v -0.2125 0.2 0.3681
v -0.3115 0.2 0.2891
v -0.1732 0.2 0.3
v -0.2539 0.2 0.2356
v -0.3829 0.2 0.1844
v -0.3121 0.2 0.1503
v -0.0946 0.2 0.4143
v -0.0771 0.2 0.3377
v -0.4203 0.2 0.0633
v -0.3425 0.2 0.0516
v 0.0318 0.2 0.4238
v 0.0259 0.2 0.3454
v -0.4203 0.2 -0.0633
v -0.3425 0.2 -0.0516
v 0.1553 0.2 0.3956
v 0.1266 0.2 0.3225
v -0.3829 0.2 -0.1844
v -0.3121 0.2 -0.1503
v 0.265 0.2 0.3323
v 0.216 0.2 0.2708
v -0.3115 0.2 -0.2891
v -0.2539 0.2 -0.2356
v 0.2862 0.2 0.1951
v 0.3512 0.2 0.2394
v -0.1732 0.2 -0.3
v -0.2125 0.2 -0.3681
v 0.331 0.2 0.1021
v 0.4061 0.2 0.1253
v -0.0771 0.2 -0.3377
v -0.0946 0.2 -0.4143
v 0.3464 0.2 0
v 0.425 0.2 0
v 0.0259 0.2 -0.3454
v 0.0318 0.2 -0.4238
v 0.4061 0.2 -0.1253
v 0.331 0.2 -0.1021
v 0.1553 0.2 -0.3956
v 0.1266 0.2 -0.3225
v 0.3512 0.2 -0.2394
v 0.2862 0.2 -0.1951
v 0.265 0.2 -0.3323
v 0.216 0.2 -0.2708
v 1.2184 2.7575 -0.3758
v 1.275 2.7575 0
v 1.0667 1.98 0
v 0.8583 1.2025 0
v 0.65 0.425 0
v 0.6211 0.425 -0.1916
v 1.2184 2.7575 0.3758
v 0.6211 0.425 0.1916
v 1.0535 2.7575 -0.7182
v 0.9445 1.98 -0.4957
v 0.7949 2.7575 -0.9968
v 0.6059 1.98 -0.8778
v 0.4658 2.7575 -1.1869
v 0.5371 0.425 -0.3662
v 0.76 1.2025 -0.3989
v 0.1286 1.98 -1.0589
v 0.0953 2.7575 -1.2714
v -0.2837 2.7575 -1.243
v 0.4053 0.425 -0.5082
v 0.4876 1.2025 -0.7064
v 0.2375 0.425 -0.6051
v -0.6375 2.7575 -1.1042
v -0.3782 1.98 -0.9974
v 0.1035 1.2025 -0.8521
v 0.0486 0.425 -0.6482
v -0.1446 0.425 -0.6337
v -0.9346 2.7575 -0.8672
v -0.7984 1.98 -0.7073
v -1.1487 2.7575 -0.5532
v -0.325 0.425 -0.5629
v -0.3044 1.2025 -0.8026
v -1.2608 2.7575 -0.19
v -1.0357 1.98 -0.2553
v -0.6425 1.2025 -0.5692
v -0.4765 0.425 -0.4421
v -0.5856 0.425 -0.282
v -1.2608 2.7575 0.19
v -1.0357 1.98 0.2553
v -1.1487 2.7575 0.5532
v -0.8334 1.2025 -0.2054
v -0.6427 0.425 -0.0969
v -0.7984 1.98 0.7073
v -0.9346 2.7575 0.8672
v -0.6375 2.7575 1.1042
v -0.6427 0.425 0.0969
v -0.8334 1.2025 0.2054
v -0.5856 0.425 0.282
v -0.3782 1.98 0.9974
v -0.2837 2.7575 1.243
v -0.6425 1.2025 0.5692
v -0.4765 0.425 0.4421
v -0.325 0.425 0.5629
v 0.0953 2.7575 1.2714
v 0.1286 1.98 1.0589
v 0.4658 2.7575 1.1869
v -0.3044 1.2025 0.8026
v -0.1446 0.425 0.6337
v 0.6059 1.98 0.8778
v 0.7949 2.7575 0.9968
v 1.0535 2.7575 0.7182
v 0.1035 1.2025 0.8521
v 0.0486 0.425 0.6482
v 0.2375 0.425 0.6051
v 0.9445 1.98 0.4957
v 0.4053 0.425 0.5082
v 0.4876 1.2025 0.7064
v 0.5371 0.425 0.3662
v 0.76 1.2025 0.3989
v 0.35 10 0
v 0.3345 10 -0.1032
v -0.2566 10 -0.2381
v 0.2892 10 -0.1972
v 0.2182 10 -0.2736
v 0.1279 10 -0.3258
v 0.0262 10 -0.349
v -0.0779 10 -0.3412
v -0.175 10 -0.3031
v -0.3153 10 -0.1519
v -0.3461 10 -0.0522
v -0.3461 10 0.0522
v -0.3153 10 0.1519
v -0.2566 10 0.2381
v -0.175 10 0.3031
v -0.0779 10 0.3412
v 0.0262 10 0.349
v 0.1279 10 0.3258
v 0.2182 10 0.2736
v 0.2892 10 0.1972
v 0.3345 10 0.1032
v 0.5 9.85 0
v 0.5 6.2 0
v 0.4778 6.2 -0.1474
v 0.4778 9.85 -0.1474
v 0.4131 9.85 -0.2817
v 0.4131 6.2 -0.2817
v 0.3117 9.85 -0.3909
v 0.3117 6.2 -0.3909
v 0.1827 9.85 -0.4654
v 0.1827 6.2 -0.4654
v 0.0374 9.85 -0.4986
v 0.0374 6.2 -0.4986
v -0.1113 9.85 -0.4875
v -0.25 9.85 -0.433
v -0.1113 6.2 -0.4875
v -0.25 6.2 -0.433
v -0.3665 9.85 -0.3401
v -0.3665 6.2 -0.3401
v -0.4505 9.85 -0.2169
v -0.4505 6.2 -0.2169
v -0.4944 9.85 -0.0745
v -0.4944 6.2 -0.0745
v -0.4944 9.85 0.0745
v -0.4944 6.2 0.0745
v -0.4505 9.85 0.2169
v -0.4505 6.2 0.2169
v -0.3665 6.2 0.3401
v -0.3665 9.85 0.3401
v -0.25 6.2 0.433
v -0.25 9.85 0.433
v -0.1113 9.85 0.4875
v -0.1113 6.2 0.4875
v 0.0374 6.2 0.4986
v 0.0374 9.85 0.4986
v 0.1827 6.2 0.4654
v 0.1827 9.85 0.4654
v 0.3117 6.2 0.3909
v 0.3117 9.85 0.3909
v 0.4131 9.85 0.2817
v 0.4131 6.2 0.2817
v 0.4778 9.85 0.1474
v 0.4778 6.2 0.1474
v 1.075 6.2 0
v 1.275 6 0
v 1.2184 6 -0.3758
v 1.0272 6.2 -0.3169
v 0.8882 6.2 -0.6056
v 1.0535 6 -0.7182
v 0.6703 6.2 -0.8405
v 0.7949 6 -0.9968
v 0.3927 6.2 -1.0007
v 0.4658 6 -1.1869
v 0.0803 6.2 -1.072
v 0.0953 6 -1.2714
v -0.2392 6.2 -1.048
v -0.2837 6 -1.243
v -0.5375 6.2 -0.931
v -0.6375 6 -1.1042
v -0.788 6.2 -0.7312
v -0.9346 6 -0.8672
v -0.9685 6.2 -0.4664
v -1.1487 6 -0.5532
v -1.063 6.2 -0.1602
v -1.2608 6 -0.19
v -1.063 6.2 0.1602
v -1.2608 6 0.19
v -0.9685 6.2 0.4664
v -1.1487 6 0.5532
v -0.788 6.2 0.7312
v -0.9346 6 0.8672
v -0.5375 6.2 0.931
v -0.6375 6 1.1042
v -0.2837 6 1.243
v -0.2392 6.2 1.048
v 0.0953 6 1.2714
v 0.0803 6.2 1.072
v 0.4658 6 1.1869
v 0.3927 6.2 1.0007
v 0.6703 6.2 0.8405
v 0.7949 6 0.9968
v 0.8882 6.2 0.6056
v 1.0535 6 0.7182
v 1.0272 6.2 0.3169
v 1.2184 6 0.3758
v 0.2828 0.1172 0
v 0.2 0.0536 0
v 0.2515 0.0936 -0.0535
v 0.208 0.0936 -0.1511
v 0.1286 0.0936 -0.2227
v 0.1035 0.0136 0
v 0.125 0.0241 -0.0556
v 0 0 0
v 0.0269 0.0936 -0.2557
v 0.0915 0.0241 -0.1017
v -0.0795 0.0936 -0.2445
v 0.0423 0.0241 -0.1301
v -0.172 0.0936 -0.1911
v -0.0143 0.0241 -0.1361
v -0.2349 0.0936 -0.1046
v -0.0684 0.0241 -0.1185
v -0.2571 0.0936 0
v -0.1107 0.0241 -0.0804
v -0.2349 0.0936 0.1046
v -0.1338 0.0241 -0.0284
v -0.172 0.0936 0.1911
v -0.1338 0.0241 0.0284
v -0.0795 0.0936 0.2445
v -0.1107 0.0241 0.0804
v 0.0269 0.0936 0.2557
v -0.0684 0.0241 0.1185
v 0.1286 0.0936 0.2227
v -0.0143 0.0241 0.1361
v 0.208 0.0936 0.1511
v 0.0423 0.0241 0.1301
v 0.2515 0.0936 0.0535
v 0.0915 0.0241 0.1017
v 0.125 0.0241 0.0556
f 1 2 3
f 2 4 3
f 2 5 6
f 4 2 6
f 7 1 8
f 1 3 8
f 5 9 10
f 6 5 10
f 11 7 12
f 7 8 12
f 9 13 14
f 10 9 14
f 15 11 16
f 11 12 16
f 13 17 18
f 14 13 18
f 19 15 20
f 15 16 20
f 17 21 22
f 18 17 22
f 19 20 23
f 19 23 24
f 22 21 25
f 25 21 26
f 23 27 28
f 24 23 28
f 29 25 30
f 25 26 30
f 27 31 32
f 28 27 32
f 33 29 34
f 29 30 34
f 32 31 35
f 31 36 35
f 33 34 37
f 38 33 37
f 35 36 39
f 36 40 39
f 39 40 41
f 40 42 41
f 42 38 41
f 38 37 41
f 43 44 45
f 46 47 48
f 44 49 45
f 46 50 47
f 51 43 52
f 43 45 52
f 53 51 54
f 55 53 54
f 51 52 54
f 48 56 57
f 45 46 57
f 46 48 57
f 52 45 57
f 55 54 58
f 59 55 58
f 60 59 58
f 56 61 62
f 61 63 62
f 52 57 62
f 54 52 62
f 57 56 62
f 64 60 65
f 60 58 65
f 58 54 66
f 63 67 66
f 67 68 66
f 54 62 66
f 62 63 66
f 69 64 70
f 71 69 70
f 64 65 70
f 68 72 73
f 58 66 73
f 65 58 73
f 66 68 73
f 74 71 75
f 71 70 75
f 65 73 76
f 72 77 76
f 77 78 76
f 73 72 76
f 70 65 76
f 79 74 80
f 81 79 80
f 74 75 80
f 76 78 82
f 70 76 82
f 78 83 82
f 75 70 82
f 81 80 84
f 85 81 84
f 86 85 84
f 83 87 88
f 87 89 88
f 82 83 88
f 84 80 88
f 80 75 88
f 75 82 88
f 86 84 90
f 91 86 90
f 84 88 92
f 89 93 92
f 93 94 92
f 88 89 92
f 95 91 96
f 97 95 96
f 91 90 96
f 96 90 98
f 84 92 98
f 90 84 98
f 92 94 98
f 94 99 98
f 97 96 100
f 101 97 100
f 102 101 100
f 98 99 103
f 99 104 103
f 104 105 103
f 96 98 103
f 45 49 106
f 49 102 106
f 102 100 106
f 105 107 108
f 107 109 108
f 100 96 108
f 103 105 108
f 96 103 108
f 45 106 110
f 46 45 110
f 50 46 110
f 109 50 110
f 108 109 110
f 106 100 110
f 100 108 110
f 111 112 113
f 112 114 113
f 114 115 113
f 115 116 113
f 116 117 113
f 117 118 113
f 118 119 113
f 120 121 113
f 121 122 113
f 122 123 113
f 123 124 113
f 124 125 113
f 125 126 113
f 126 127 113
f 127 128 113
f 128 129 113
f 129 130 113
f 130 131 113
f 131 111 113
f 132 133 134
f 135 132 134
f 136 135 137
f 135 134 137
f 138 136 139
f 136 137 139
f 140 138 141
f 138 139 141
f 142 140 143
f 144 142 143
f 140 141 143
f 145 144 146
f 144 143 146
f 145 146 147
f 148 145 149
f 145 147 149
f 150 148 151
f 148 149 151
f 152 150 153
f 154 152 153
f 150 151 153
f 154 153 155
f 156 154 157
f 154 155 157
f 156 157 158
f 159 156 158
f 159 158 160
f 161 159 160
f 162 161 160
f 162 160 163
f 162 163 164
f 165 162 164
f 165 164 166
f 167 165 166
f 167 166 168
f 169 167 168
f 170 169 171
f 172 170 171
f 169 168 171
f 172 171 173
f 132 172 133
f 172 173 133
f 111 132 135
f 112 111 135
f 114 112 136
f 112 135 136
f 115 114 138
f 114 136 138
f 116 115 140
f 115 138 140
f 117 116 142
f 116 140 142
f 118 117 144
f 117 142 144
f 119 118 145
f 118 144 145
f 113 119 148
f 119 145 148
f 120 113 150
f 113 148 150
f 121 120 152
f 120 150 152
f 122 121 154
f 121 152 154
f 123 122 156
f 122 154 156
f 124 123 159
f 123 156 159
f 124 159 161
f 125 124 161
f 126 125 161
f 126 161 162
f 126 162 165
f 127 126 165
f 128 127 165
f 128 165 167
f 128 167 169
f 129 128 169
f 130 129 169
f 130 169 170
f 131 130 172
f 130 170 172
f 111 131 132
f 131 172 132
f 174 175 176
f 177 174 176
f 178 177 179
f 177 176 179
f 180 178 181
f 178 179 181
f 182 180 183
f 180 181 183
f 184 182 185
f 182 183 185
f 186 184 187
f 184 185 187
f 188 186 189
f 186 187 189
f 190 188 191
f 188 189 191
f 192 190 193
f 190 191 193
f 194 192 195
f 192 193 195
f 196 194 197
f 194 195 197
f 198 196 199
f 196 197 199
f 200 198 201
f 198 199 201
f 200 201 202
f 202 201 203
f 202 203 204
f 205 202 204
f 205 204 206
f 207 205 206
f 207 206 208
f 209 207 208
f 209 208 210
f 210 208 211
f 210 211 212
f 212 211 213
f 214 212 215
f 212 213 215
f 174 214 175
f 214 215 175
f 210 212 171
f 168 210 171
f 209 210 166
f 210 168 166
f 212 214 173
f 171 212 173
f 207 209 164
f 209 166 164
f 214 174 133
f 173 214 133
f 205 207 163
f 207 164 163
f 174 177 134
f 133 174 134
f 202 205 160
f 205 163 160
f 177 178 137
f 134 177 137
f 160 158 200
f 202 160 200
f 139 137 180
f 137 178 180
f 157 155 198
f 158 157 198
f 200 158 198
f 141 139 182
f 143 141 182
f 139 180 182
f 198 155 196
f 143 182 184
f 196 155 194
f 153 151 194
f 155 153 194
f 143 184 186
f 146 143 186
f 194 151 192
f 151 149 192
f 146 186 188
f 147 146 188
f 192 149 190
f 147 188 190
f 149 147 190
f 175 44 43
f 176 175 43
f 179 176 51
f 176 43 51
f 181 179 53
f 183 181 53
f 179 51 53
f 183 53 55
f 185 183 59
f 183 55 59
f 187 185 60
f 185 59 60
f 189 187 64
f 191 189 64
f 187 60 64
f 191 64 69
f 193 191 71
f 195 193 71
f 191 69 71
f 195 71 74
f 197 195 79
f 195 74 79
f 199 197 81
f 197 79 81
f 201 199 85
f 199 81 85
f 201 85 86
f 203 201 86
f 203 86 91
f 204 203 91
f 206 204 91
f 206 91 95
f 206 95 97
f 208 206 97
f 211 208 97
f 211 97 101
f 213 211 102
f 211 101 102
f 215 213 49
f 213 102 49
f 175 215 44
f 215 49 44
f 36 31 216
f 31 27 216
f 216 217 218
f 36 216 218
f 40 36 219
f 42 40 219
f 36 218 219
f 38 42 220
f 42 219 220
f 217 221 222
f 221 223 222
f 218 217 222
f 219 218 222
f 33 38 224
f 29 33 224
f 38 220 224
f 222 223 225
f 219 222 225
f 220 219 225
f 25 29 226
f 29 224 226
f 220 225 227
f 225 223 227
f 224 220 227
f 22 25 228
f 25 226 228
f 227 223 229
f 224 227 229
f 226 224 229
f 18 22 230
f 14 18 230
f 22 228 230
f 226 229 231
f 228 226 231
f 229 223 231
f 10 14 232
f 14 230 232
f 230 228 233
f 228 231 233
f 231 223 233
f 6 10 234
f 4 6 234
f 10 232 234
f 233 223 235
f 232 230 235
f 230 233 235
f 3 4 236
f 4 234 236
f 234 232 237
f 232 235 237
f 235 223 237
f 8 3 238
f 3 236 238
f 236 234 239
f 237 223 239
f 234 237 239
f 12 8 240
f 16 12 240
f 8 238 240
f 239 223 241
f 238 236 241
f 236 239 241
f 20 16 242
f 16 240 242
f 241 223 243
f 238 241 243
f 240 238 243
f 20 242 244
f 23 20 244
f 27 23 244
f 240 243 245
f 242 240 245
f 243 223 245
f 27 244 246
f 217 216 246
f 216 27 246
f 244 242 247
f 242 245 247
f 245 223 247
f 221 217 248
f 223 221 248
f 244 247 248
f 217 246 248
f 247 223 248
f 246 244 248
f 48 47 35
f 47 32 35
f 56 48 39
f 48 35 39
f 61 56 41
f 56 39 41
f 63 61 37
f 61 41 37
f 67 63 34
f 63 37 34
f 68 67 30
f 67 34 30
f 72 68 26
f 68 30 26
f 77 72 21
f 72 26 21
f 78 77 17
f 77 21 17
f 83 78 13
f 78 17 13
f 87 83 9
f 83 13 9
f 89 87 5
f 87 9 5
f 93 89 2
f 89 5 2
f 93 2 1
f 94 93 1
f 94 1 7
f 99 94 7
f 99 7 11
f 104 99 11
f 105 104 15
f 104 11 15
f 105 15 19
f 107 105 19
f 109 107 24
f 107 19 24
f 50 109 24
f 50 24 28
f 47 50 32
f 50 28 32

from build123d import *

# Parameters (mm, degrees)
CHAMFER1_SIZE = 0.15
CHAMFER2_SIZE = 0.2


with BuildPart() as part:
    # Sketch1 → Base-Revolve (revolve)
    with BuildSketch(Plane.XY, mode=Mode.PRIVATE) as base_revolve_sk:
        with BuildLine():
            Line((0, 10), (-0.5, 10))
            Line((-0.5, 10), (-0.5, 6.2))
            Line((-0.5, 6.2), (-1.275, 6.2))
            Line((-1.275, 6.2), (-1.275, 2.757531755))
            Line((-1.275, 2.757531755), (-0.65, 0.425))
            Line((-0.65, 0.425), (-0.425, 0.2))
            Line((-0.425, 0.2), (-0.346410162, 0.2))
            ThreePointArc((-0.346410162, 0.2), (-0.2, 0.053589838), (0, 0))
            Line((0, 0), (0, 10))
        make_face()
    revolve(base_revolve_sk.sketch.rotate(Axis((0, -4.076789028, 0), (0, 1, 0)), 180), axis=Axis((0, -4.076789028, 0), (0, 1, 0)))

    # Chamfer1
    chamfer1_edges = [part.edges().sort_by_distance(p)[0] for p in [
        (-0.5, 10, 0),
    ]]
    chamfer(chamfer1_edges, length=CHAMFER1_SIZE)

    # Chamfer2
    chamfer2_edges = [part.edges().sort_by_distance(p)[0] for p in [
        (-1.275, 6.2, 0),
    ]]
    chamfer(chamfer2_edges, length=CHAMFER2_SIZE)


solid = part.part
